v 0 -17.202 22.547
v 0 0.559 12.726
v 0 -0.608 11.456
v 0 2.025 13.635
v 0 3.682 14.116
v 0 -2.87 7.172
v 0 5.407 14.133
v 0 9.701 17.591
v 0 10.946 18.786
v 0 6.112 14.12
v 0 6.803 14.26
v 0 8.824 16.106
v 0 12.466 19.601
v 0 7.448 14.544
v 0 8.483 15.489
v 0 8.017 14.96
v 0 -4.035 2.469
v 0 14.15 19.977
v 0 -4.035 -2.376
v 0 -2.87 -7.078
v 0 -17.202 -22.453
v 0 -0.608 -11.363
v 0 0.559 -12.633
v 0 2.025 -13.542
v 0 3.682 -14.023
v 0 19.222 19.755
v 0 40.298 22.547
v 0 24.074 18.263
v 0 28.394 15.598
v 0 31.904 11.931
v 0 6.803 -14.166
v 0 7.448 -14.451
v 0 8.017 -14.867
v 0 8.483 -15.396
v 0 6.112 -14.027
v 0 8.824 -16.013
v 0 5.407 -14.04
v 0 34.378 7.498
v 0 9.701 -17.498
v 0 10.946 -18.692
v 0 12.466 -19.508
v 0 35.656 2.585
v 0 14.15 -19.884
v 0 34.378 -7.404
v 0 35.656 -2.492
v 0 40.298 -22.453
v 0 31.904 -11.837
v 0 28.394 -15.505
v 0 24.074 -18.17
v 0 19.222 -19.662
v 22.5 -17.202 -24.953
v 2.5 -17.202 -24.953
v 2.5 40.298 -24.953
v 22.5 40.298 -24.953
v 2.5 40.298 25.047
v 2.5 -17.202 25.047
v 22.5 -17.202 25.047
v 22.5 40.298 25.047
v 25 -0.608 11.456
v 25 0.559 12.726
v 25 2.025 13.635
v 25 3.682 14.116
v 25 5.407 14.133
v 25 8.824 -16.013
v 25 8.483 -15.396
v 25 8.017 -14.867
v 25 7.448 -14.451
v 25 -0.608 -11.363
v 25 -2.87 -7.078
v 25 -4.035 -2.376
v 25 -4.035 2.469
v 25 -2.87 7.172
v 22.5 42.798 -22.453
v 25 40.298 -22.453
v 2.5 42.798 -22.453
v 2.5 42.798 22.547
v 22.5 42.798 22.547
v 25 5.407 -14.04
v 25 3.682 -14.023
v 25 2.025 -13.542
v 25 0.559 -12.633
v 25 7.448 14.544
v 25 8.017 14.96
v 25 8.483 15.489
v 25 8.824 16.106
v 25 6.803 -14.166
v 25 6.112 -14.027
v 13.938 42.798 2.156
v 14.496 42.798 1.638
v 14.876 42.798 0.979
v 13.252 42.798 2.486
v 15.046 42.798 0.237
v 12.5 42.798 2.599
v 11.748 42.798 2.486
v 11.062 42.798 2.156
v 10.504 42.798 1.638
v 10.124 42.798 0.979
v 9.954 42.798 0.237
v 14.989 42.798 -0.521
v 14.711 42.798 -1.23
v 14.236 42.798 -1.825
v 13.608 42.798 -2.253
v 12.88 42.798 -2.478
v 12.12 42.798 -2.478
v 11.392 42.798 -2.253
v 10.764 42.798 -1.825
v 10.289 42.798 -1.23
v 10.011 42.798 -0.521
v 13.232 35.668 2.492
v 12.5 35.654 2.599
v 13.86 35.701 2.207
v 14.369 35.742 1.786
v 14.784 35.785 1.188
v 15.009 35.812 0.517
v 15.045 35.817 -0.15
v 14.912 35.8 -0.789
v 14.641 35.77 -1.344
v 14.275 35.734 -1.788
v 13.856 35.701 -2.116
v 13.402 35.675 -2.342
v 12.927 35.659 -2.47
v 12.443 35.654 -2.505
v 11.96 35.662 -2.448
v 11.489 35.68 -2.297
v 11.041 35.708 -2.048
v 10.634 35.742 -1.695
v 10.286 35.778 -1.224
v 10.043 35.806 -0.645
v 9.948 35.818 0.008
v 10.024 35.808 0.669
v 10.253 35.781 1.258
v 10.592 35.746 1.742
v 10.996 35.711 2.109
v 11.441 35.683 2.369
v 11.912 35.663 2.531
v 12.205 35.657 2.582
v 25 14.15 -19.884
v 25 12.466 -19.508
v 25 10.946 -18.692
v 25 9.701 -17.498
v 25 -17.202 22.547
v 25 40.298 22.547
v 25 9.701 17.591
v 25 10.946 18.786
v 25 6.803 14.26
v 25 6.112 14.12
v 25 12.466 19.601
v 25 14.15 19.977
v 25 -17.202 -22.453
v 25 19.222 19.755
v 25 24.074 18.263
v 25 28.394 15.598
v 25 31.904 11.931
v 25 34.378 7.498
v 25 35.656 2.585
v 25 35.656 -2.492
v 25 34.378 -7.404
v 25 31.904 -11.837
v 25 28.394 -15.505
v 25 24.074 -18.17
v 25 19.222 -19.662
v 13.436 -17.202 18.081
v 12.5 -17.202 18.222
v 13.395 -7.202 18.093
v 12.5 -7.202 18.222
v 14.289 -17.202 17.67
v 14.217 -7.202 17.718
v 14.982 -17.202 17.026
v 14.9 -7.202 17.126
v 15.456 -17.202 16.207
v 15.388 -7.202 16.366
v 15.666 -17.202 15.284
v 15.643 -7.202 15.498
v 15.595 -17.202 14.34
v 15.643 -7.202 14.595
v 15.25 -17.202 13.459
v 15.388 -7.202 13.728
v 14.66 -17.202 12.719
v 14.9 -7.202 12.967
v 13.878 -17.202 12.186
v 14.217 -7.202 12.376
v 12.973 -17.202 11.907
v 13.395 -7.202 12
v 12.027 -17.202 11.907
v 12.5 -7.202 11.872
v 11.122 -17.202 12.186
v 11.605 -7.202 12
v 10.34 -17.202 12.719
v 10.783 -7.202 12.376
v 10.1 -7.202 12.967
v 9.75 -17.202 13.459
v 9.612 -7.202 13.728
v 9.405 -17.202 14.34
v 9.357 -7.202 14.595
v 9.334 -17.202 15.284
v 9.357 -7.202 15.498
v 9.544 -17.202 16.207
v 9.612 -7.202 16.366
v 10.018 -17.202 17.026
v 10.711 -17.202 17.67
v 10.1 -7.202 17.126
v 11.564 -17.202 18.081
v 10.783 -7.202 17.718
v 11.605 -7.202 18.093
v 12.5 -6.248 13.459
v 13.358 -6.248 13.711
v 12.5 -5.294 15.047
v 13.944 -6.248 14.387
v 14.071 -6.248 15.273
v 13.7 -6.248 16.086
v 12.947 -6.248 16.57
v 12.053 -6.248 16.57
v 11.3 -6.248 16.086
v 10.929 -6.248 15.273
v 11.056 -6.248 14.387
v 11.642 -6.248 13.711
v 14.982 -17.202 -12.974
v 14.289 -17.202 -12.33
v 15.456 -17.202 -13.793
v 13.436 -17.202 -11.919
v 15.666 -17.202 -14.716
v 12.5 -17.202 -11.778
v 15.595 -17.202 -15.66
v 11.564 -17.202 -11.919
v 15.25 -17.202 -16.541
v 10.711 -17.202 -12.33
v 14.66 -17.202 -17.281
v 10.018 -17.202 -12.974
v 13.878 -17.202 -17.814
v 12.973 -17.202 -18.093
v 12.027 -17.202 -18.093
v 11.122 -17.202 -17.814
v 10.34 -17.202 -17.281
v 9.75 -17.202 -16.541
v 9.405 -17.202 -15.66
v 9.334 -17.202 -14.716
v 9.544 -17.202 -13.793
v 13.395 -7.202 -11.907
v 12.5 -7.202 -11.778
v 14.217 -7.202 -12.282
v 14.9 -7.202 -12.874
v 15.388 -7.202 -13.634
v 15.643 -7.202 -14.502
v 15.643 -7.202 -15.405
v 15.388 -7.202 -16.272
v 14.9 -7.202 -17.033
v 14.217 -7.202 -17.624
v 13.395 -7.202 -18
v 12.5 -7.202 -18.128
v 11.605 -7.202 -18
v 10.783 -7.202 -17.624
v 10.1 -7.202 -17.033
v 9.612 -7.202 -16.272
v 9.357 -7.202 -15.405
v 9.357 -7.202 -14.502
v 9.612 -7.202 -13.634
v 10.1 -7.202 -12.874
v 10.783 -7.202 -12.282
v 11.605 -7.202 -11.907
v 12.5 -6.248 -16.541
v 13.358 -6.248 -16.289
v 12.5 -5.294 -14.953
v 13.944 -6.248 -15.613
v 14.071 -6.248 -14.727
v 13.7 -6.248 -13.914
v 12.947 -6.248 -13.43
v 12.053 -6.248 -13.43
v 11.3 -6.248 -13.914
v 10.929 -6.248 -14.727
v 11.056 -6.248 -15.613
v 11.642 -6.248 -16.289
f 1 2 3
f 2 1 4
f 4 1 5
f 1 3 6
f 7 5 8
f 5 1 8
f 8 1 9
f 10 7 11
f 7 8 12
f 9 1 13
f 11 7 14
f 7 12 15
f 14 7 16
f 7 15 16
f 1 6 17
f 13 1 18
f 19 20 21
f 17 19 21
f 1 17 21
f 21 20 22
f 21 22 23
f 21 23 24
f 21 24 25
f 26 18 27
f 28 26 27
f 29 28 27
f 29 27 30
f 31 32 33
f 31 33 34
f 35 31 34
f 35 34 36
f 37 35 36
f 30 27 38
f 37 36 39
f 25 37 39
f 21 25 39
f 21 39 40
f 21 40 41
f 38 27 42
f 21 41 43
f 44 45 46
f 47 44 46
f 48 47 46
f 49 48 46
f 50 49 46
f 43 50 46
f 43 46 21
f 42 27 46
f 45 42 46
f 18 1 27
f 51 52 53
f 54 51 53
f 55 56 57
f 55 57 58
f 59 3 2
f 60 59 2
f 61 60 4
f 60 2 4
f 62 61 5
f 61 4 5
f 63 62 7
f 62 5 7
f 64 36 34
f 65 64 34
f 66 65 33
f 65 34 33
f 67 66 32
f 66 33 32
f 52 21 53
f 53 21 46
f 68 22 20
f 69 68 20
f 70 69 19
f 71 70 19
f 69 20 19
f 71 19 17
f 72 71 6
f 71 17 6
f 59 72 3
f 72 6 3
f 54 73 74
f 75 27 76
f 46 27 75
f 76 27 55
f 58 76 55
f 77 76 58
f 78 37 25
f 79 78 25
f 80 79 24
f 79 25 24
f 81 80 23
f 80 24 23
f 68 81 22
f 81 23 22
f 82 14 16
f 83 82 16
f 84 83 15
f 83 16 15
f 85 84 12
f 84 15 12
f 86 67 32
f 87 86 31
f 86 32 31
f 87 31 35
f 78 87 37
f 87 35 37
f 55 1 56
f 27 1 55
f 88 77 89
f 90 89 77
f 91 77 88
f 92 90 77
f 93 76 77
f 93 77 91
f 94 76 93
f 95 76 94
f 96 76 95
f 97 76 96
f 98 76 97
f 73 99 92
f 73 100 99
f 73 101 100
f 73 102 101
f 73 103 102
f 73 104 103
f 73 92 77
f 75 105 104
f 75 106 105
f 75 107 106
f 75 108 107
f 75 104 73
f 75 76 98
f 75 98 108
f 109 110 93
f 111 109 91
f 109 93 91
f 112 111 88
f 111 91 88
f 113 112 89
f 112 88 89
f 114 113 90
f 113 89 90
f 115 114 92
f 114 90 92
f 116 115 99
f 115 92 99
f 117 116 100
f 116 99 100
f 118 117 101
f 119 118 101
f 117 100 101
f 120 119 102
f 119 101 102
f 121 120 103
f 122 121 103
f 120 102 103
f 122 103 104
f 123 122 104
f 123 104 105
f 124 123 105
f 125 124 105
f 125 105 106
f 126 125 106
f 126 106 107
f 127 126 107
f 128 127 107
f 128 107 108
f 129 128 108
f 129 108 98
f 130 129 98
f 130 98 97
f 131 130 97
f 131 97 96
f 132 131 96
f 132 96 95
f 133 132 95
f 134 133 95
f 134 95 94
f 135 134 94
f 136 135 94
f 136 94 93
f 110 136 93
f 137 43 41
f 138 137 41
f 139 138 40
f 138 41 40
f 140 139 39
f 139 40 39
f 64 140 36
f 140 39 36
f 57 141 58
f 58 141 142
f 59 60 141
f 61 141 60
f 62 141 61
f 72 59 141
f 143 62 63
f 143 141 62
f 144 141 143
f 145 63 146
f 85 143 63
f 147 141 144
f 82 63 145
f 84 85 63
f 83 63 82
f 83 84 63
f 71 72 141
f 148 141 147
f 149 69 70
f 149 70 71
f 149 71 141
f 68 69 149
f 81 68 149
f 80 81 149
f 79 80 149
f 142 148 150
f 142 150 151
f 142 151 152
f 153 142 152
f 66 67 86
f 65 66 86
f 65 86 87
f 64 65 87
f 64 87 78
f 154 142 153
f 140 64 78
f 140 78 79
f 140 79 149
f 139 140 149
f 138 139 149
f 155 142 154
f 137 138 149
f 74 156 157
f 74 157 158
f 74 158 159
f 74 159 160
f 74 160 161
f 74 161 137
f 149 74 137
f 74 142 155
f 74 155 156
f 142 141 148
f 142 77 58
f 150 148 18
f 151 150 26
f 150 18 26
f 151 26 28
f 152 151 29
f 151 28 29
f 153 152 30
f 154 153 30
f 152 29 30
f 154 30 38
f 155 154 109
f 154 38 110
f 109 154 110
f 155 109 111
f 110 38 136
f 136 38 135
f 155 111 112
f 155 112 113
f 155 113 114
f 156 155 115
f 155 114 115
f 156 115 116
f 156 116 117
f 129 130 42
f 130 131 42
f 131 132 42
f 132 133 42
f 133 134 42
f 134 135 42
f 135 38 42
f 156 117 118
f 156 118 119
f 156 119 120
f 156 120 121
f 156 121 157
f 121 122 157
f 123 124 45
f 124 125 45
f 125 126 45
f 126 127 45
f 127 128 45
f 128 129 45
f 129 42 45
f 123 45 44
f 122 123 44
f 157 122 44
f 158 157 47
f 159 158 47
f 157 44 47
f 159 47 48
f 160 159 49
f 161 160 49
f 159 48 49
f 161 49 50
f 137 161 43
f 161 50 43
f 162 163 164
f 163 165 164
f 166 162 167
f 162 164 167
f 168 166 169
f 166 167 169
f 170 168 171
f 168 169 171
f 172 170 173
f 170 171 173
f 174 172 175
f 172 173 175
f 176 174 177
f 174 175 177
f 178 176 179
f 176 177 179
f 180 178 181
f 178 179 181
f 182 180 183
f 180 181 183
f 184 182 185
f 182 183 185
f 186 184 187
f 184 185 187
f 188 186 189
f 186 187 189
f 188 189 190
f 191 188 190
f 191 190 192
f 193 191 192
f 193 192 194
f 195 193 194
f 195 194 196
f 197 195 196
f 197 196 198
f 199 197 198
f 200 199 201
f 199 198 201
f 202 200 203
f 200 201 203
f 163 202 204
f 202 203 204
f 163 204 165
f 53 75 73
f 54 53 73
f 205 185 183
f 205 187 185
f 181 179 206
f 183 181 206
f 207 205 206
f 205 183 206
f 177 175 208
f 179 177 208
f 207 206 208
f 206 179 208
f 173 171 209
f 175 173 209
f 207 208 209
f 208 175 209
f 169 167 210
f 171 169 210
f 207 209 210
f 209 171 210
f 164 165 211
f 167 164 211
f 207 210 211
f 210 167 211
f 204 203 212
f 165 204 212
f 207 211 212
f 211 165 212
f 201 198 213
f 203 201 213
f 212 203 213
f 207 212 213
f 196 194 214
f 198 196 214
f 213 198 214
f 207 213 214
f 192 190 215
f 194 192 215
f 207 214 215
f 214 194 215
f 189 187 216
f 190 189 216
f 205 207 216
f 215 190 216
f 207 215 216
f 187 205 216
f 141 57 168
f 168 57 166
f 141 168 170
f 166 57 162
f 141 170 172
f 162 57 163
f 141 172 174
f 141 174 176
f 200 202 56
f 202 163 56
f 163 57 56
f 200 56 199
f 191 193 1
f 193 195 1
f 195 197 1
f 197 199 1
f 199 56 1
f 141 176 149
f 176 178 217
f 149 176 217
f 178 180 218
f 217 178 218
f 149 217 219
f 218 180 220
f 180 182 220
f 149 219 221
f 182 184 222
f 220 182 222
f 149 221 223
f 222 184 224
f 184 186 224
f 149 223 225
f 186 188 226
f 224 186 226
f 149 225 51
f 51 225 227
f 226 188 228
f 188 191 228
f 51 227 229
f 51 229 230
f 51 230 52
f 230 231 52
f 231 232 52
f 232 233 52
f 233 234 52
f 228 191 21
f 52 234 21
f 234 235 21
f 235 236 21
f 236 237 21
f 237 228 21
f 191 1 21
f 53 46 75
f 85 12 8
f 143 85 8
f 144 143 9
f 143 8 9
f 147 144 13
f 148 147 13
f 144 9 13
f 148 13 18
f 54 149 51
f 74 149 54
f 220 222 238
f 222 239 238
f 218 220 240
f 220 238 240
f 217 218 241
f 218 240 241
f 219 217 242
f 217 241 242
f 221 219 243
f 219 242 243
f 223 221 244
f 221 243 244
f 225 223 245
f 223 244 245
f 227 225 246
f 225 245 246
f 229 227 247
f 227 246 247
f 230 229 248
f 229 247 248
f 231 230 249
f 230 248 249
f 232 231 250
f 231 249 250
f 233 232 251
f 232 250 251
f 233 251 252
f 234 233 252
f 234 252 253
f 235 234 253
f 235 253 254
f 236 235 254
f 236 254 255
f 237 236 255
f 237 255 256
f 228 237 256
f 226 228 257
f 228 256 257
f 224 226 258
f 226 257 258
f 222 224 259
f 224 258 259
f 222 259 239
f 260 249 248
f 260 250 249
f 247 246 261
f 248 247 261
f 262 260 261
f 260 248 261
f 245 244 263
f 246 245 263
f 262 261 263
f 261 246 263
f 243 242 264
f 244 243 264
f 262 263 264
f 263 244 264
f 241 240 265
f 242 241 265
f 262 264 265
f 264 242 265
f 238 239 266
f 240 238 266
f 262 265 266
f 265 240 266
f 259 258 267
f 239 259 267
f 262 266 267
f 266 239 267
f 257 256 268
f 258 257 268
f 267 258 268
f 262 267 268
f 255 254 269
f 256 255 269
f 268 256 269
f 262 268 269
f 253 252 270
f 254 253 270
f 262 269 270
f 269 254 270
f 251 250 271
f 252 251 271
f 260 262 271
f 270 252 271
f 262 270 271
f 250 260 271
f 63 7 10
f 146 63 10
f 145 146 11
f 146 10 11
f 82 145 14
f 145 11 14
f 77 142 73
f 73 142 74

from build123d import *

# Parameters (mm, degrees)
SKETCH1_W                       = 50
SKETCH1_H                       = 60
SKETCH1_R                       = 20
BOSS_EXTRUDE1_DEPTH             = 25
CHAMFER1_SIZE                   = 2.5
F_1_4_20_TAPPED_HOLE1_REACH     = 68.191
F_1_4_20_TAPPED_HOLE1_BORE_R    = 2.5527
F_1_4_0_25_DIAMETER_HOLE1_D     = 6.35
F_1_4_0_25_DIAMETER_HOLE1_DEPTH = 10
F_1_4_0_25_DIAMETER_HOLE1_TIP   = 1.907732465


with BuildPart() as part:
    # Sketch1 → Boss-Extrude1 (new body)
    with BuildSketch(Plane(origin=(0, 0, 0), x_dir=(0, 0, -1), z_dir=(1, 0, 0))):
        with Locations((-0.046631749, 12.797960187)):
            Rectangle(SKETCH1_W, SKETCH1_H)
        with Locations((-0.046631749, 15.817960187)):
            Circle(SKETCH1_R, mode=Mode.SUBTRACT)
        with BuildLine():
            ThreePointArc((15.41920449, 3.136954335), (17.273876327, 5.817960187), (18.668359584, 8.764656039))
            ThreePointArc((18.668359584, 8.764656039), (17.346806711, 9.077144311), (16.012598617, 8.824083694))
            ThreePointArc((16.012598617, 8.824083694), (15.118822775, 8.264047714), (14.450633556, 7.447960267))
            ThreePointArc((14.450633556, 7.447960267), (14.077975631, 6.461247636), (14.039858148, 5.407196971))
            ThreePointArc((14.039858148, 5.407196971), (14.487805271, 4.125208558), (15.41920449, 3.136954335))
        make_face()
        with BuildLine():
            ThreePointArc((-16.105862115, 8.824083694), (-17.440070209, 9.077144311), (-18.761623082, 8.764656039))
            ThreePointArc((-18.761623082, 8.764656039), (-17.367139825, 5.817960187), (-15.512467988, 3.136954335))
            ThreePointArc((-15.512467988, 3.136954335), (-14.581068769, 4.125208558), (-14.133121646, 5.407196971))
            ThreePointArc((-14.133121646, 5.407196971), (-14.17123911, 6.461247542), (-14.543896959, 7.447960101))
            ThreePointArc((-14.543896959, 7.447960101), (-15.212086202, 8.264047651), (-16.105862115, 8.824083694))
        make_face()
        with BuildLine():
            ThreePointArc((18.668359584, 8.764656039), (19.462739812, 11.415185915), (19.883693667, 14.149988727))
            ThreePointArc((19.883693667, 14.149988727), (18.69234004, 10.946124329), (16.012598617, 8.824083694))
            ThreePointArc((16.012598617, 8.824083694), (17.346806711, 9.077144311), (18.668359584, 8.764656039))
        make_face()
        with BuildLine():
            ThreePointArc((11.363036616, -0.6082222), (13.520968398, 1.123735939), (15.41920449, 3.136954335))
            ThreePointArc((15.41920449, 3.136954335), (14.487805271, 4.125208558), (14.039858148, 5.407196971))
            ThreePointArc((14.039858148, 5.407196971), (13.541987762, 2.025452506), (11.363036616, -0.6082222))
        make_face()
        with BuildLine():
            ThreePointArc((-16.105862115, 8.824083694), (-18.785603538, 10.946124329), (-19.976957166, 14.149988727))
            ThreePointArc((-19.976957166, 14.149988727), (-19.55600331, 11.415185915), (-18.761623082, 8.764656039))
            ThreePointArc((-18.761623082, 8.764656039), (-17.440070209, 9.077144311), (-16.105862115, 8.824083694))
        make_face()
        with BuildLine():
            ThreePointArc((-14.133121646, 5.407196971), (-14.581068769, 4.125208558), (-15.512467988, 3.136954335))
            ThreePointArc((-15.512467988, 3.136954335), (-13.614231896, 1.123735939), (-11.456300114, -0.6082222))
            ThreePointArc((-11.456300114, -0.6082222), (-13.63525126, 2.025452506), (-14.133121646, 5.407196971))
        make_face()
    extrude(amount=BOSS_EXTRUDE1_DEPTH)

    # Chamfer1
    chamfer1_edges = [part.edges().sort_by_distance(p)[0] for p in [
        (0, 12.797960187, -24.953368251),
        (0, 12.797960187, 25.046631749),
        (0, 42.797960187, 0.046631749),
        (12.5, 42.797960187, -24.953368251),
        (12.5, 42.797960187, 25.046631749),
        (25, 42.797960187, 0.046631749),
        (25, 12.797960187, 25.046631749),
        (25, 12.797960187, -24.953368251),
    ]]
    chamfer(chamfer1_edges, length=CHAMFER1_SIZE)

    # 1/4-20 Tapped Hole1 bore (on position points) → 1/4-20 Tapped Hole1 (cut, up to next)
    with BuildSketch(Plane(origin=(12.5, 42.797960187, 0.046631749), x_dir=(0, 0, 1), z_dir=(0, 1, 0)), mode=Mode.PRIVATE) as f_1_4_20_tapped_hole1_sk1:
        Circle(F_1_4_20_TAPPED_HOLE1_BORE_R)
    f_1_4_20_tapped_hole1_tool1 = extrude(f_1_4_20_tapped_hole1_sk1.sketch, amount=-F_1_4_20_TAPPED_HOLE1_REACH, mode=Mode.PRIVATE) & part.part
    add(f_1_4_20_tapped_hole1_tool1.solids().sort_by_distance((12.5, 42.79796, 0.046632))[0], mode=Mode.SUBTRACT)

    # 1/4 (0.25) Diameter Hole1
    with Locations(Plane(origin=(12.5, -17.202039813, 15.046631749), x_dir=(0, 0, -1), z_dir=(0, -1, 0))):
        with Locations((0, 0), (30, 0)):
            Hole(F_1_4_0_25_DIAMETER_HOLE1_D / 2, depth=F_1_4_0_25_DIAMETER_HOLE1_DEPTH)
            with Locations((0, 0, -(F_1_4_0_25_DIAMETER_HOLE1_DEPTH + F_1_4_0_25_DIAMETER_HOLE1_TIP / 2))):  # 118° drill point
                Cone(0, F_1_4_0_25_DIAMETER_HOLE1_D / 2, F_1_4_0_25_DIAMETER_HOLE1_TIP, mode=Mode.SUBTRACT)


solid = part.part
